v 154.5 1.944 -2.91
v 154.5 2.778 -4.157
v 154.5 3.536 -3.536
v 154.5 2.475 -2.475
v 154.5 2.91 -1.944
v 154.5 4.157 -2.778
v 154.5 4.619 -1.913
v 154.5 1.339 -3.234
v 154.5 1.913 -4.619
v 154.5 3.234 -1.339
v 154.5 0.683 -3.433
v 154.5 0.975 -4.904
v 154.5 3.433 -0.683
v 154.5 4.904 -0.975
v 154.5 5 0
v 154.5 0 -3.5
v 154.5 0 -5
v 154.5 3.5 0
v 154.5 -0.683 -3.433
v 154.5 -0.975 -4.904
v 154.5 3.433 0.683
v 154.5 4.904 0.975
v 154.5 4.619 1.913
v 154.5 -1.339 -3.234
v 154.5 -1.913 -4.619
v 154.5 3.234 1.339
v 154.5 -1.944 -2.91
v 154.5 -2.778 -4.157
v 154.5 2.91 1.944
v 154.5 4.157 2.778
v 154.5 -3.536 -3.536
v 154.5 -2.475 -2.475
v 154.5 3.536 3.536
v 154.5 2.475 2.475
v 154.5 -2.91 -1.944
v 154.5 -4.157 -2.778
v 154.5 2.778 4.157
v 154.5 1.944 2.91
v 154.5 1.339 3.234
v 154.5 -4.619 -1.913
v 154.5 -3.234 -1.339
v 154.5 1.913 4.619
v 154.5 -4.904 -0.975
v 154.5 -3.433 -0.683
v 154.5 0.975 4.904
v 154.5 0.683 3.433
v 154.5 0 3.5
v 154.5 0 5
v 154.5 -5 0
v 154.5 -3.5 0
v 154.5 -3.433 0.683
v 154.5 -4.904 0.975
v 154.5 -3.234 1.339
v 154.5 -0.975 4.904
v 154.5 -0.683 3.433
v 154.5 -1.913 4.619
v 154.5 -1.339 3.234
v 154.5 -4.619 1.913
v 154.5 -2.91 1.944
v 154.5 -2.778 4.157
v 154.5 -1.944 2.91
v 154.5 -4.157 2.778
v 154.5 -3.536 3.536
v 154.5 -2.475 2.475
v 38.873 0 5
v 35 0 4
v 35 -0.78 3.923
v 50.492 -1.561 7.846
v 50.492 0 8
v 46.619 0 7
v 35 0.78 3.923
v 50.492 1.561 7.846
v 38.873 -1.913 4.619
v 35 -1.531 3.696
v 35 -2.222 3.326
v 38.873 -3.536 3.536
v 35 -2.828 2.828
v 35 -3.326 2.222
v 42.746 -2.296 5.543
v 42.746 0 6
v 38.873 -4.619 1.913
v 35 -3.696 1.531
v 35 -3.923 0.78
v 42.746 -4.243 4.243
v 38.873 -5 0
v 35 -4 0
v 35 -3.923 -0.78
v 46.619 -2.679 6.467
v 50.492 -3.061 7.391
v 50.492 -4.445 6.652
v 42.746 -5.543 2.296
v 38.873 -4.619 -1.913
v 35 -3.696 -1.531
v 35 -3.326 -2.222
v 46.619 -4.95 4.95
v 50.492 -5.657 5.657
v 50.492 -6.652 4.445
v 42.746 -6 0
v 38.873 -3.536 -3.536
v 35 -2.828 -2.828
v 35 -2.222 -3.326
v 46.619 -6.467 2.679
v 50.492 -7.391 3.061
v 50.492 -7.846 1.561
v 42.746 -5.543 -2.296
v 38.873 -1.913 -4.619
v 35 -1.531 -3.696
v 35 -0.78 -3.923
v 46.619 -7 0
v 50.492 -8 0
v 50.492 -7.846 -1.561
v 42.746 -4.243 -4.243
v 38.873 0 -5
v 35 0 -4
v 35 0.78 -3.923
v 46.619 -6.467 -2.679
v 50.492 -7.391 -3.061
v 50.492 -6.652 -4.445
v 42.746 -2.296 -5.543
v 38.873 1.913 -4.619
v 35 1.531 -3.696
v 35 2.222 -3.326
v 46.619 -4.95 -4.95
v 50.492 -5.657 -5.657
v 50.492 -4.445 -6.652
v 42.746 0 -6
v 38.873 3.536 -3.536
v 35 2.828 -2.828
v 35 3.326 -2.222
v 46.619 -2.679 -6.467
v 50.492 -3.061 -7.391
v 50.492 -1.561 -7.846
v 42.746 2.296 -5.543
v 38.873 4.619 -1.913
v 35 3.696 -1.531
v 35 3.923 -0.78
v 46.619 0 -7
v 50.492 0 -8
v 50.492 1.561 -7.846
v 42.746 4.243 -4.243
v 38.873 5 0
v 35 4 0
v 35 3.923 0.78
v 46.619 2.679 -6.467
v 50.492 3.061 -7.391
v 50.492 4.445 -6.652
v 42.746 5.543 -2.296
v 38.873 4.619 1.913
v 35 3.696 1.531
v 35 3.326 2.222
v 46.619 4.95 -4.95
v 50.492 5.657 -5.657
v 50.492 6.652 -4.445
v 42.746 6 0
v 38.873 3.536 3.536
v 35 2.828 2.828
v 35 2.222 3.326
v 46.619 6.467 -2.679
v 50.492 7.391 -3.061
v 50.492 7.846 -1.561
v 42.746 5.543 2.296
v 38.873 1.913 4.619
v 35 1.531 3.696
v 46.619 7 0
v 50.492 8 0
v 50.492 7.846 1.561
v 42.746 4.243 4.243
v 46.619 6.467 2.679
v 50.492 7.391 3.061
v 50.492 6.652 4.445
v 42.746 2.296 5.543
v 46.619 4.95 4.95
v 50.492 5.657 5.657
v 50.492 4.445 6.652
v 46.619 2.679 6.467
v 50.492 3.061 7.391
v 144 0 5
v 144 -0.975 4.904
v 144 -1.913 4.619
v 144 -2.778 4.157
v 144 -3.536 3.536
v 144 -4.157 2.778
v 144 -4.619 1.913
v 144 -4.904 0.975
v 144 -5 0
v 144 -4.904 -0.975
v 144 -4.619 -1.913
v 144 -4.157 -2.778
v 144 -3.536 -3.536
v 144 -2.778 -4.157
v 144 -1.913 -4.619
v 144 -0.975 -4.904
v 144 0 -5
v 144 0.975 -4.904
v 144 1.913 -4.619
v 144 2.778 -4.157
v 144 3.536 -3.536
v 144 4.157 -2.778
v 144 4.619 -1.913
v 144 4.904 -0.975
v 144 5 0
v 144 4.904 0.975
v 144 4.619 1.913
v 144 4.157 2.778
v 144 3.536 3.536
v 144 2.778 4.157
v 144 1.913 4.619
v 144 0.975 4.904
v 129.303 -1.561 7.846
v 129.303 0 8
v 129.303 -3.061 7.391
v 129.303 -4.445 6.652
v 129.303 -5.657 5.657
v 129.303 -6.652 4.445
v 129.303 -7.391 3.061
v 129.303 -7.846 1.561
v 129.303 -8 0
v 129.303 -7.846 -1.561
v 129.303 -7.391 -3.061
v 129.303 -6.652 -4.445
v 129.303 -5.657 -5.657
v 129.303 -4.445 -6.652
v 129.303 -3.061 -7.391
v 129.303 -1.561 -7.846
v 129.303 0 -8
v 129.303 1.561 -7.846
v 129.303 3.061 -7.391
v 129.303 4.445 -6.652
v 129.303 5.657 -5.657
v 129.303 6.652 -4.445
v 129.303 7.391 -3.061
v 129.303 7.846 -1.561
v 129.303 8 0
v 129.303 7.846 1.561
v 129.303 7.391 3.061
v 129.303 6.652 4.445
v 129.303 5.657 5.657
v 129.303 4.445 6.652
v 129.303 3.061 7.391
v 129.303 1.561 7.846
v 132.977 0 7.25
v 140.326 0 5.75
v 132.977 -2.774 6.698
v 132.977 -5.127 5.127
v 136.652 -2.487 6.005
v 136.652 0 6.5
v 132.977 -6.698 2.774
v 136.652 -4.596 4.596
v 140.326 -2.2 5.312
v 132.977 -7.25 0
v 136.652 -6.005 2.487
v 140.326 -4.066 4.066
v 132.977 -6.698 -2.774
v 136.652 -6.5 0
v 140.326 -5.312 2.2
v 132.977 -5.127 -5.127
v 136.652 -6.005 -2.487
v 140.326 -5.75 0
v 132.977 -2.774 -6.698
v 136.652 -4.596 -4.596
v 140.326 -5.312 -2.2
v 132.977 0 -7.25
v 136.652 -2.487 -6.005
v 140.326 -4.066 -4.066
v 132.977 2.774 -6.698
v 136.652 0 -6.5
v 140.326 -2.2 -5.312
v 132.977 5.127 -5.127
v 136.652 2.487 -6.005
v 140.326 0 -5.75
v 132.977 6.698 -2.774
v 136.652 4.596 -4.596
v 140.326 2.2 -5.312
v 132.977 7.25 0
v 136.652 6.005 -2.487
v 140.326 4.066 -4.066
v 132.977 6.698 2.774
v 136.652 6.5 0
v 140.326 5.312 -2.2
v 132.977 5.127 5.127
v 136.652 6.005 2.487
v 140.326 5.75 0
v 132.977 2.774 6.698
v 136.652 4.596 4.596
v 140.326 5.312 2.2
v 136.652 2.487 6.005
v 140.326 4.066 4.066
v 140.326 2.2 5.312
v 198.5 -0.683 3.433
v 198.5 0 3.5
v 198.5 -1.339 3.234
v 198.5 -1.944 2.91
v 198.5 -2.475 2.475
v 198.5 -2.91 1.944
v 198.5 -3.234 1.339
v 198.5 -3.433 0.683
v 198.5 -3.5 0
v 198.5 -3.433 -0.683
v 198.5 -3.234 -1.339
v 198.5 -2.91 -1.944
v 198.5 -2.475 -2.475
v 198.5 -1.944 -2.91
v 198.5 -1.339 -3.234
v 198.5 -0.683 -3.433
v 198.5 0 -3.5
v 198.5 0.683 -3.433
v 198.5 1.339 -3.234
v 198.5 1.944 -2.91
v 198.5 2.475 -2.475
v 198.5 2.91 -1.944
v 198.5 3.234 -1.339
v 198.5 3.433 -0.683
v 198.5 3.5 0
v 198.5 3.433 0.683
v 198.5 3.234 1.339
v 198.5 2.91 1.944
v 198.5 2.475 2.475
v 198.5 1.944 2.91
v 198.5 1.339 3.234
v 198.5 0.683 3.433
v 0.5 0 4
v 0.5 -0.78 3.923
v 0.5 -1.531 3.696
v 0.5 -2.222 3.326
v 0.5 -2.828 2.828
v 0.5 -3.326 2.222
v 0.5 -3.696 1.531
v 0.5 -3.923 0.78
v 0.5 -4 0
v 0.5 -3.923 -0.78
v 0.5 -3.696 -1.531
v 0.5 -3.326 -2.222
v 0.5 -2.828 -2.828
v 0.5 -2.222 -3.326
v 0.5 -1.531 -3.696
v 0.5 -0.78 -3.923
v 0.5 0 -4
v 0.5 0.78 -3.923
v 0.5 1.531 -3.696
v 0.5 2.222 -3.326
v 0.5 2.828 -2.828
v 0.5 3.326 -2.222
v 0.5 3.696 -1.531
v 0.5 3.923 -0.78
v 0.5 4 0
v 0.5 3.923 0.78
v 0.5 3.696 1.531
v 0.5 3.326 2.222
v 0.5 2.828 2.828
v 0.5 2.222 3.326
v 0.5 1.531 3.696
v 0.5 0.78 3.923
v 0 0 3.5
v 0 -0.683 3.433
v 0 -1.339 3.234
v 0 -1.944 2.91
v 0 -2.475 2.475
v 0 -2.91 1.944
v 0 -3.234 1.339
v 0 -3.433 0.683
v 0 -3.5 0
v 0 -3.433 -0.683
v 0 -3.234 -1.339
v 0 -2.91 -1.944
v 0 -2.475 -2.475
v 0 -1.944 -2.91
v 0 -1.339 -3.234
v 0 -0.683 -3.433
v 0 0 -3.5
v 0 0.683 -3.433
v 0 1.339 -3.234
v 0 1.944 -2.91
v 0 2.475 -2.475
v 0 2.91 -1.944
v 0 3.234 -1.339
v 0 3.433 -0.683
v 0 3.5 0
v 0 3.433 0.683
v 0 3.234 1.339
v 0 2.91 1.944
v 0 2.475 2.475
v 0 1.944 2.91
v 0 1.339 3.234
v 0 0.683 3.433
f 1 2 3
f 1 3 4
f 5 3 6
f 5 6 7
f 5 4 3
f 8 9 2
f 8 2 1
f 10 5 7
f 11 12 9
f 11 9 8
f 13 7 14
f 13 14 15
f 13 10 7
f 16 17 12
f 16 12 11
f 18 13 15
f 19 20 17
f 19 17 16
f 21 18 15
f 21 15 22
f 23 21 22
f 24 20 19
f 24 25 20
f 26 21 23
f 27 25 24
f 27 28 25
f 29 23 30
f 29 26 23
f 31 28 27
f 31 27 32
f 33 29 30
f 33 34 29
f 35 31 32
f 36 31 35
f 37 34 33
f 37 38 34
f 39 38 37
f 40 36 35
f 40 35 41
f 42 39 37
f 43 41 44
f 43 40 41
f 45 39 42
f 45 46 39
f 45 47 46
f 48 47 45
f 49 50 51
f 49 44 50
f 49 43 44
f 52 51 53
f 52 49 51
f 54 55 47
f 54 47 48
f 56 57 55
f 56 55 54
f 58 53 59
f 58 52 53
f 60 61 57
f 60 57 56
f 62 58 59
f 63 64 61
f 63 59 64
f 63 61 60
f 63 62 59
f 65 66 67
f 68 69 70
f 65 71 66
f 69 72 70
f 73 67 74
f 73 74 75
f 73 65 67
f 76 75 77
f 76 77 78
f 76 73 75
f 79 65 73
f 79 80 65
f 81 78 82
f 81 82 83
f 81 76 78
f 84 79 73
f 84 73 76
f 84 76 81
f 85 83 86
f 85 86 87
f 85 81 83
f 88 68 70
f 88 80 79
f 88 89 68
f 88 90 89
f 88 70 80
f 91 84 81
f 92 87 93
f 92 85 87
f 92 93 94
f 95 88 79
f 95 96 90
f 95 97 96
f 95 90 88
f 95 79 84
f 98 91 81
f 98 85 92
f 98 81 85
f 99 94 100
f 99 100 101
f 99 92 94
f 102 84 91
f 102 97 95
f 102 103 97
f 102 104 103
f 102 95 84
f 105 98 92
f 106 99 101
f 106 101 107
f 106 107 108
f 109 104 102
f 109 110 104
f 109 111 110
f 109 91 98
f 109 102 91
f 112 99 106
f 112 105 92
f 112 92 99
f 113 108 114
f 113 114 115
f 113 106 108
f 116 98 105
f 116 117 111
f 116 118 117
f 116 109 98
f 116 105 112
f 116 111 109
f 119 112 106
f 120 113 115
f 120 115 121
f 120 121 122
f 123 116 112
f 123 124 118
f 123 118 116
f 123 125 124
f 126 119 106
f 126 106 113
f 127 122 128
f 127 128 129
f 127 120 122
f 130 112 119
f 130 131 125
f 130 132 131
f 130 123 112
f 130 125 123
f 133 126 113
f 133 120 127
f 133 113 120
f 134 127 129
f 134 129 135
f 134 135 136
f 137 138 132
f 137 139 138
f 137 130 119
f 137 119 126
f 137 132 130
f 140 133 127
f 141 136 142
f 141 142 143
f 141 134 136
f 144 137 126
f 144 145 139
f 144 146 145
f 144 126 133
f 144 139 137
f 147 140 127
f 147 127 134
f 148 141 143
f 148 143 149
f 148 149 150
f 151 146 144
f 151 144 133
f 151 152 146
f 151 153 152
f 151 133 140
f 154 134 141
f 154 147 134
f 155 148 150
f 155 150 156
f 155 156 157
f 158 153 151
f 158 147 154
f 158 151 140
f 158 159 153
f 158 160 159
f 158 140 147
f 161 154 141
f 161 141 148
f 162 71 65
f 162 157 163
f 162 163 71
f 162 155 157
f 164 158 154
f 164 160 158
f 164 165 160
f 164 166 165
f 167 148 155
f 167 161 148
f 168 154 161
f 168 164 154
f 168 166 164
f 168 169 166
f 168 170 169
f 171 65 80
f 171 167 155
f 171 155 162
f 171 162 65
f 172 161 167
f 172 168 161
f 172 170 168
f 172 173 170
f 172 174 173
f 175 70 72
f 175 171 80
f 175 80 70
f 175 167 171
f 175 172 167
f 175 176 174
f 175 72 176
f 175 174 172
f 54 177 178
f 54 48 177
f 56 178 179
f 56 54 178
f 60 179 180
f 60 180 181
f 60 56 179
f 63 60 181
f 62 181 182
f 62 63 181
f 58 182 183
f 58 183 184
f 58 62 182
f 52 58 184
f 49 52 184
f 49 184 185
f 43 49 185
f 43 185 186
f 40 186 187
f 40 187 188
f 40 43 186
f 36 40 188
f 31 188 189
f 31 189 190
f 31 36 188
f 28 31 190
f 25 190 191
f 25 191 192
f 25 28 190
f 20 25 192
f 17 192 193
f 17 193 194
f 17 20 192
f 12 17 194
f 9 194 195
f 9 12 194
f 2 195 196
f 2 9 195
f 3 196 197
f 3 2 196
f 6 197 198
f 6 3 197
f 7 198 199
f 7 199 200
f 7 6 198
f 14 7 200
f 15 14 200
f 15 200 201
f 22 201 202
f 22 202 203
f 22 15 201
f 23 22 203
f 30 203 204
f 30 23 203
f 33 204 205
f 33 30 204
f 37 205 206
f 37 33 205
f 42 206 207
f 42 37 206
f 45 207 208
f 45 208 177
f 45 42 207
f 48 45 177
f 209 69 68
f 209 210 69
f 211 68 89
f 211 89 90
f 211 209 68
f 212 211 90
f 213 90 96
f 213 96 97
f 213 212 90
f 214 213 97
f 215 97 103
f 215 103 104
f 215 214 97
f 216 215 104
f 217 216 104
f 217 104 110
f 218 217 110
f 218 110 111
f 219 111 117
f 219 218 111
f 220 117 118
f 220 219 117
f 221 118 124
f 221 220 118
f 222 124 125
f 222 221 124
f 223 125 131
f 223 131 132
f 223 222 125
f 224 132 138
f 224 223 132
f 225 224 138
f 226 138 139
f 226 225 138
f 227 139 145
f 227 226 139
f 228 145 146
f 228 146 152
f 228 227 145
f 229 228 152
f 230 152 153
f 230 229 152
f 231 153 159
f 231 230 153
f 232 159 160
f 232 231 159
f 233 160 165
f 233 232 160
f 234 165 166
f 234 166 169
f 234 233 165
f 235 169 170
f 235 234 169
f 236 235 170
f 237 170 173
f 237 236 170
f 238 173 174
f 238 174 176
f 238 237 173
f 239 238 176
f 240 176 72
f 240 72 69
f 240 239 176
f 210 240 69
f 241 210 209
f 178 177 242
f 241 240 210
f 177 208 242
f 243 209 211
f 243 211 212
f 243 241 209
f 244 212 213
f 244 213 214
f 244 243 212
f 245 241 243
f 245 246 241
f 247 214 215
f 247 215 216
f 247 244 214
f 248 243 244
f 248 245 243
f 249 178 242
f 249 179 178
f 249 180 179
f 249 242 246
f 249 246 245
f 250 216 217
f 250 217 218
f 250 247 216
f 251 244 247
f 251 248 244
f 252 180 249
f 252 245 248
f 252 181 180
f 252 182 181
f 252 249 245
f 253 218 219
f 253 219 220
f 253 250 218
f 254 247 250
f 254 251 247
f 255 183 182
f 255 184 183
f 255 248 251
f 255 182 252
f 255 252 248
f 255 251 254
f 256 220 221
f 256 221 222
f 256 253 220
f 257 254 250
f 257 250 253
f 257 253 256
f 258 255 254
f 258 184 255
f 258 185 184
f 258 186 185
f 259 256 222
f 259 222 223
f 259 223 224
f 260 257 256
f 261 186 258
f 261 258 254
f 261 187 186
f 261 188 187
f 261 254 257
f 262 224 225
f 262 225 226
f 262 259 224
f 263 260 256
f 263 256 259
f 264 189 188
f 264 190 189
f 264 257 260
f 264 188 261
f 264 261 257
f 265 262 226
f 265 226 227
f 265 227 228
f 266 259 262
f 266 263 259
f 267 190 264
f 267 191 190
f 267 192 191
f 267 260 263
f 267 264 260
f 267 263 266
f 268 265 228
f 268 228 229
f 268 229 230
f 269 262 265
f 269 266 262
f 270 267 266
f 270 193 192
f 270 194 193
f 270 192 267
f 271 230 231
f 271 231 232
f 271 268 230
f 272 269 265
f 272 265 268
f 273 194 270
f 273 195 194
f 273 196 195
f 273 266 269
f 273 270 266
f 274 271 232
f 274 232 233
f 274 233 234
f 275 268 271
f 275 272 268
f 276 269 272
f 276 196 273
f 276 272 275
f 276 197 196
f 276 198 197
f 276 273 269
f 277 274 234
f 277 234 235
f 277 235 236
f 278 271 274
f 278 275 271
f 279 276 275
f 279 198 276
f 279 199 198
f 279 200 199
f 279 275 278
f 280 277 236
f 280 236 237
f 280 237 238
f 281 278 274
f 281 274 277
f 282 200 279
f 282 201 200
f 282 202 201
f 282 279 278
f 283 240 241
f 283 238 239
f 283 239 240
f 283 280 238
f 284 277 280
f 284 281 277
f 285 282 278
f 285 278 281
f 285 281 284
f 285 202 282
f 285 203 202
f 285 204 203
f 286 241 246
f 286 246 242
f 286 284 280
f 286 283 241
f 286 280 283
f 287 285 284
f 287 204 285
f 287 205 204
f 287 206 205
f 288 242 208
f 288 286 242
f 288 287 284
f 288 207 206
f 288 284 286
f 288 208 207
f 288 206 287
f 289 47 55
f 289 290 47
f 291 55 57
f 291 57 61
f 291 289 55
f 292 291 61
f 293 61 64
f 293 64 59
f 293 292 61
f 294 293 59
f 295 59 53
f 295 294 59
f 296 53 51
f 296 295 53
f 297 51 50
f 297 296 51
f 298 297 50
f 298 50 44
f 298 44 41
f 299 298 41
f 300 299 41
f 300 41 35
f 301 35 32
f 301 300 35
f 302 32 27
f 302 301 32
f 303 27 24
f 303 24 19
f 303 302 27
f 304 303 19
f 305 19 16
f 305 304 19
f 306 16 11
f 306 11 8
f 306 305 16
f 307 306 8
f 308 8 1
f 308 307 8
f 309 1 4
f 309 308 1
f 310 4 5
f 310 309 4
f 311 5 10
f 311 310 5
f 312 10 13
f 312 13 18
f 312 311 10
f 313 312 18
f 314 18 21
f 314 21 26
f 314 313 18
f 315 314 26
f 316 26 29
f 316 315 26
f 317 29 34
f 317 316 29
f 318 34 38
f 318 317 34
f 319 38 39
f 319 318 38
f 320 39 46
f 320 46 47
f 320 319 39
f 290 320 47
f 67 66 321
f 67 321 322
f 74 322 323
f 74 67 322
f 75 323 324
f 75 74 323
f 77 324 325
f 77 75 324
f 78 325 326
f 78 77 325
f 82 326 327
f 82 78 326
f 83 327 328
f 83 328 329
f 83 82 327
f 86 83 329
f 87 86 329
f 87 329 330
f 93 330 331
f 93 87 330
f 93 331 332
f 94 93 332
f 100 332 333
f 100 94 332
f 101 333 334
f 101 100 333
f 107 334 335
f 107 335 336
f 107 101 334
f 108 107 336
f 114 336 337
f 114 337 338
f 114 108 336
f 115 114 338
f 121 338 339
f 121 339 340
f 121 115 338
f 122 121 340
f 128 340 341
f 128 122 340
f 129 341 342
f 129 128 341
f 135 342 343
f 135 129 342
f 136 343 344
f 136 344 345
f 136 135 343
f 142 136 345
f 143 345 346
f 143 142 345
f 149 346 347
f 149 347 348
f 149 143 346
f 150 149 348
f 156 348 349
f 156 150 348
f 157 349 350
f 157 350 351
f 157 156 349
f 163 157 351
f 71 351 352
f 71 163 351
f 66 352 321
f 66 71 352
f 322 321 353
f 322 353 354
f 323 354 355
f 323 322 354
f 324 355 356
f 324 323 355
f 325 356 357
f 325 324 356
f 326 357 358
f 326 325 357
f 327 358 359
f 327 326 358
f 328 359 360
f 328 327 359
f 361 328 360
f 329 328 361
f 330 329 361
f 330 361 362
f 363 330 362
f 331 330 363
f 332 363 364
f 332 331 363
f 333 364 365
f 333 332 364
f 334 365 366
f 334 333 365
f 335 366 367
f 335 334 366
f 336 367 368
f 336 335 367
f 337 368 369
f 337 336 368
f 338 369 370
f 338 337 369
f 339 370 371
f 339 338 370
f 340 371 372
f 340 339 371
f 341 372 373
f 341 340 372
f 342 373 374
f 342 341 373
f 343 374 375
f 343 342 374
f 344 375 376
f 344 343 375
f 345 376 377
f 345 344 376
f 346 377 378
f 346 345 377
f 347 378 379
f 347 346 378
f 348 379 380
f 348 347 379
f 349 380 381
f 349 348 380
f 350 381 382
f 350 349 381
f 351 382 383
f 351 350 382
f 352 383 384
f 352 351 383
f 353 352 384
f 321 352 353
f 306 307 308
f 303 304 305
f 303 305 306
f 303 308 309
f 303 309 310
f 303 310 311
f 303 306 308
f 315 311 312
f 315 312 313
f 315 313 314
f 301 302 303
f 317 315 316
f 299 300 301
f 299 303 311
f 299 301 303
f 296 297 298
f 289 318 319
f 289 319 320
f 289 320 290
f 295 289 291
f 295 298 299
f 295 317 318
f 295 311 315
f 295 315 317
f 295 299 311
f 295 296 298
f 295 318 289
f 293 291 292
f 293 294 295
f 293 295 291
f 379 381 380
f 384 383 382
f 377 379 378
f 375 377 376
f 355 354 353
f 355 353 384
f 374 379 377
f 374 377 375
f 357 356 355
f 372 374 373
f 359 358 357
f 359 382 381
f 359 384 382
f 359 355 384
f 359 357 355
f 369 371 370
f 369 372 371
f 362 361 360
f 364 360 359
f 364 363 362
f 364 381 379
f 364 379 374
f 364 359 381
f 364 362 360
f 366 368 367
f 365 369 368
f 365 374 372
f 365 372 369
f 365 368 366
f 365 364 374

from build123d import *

# Parameters (mm, degrees)
PAH1_SIZE = 0.5


with BuildPart() as part:
    # Çizim1 → Döndür1 (revolve)
    with BuildSketch(Plane.XY, mode=Mode.PRIVATE) as d_nd_r1_sk:
        Polygon((0, 0), (0, 4), (35, 4), (50.491933385, 8), (129.303061543, 8), (144, 5), (154.5, 5), (154.5, 3.5), (198.5, 3.5), (198.5, 0), align=None)
    revolve(d_nd_r1_sk.sketch.rotate(Axis((0, 0, 0), (1, 0, 0)), 90), axis=Axis((0, 0, 0), (1, 0, 0)))

    # Pah1
    pah1_edges = [part.edges().sort_by_distance(p)[0] for p in [
        (0, 0, -4),
    ]]
    chamfer(pah1_edges, length=PAH1_SIZE)


solid = part.part
